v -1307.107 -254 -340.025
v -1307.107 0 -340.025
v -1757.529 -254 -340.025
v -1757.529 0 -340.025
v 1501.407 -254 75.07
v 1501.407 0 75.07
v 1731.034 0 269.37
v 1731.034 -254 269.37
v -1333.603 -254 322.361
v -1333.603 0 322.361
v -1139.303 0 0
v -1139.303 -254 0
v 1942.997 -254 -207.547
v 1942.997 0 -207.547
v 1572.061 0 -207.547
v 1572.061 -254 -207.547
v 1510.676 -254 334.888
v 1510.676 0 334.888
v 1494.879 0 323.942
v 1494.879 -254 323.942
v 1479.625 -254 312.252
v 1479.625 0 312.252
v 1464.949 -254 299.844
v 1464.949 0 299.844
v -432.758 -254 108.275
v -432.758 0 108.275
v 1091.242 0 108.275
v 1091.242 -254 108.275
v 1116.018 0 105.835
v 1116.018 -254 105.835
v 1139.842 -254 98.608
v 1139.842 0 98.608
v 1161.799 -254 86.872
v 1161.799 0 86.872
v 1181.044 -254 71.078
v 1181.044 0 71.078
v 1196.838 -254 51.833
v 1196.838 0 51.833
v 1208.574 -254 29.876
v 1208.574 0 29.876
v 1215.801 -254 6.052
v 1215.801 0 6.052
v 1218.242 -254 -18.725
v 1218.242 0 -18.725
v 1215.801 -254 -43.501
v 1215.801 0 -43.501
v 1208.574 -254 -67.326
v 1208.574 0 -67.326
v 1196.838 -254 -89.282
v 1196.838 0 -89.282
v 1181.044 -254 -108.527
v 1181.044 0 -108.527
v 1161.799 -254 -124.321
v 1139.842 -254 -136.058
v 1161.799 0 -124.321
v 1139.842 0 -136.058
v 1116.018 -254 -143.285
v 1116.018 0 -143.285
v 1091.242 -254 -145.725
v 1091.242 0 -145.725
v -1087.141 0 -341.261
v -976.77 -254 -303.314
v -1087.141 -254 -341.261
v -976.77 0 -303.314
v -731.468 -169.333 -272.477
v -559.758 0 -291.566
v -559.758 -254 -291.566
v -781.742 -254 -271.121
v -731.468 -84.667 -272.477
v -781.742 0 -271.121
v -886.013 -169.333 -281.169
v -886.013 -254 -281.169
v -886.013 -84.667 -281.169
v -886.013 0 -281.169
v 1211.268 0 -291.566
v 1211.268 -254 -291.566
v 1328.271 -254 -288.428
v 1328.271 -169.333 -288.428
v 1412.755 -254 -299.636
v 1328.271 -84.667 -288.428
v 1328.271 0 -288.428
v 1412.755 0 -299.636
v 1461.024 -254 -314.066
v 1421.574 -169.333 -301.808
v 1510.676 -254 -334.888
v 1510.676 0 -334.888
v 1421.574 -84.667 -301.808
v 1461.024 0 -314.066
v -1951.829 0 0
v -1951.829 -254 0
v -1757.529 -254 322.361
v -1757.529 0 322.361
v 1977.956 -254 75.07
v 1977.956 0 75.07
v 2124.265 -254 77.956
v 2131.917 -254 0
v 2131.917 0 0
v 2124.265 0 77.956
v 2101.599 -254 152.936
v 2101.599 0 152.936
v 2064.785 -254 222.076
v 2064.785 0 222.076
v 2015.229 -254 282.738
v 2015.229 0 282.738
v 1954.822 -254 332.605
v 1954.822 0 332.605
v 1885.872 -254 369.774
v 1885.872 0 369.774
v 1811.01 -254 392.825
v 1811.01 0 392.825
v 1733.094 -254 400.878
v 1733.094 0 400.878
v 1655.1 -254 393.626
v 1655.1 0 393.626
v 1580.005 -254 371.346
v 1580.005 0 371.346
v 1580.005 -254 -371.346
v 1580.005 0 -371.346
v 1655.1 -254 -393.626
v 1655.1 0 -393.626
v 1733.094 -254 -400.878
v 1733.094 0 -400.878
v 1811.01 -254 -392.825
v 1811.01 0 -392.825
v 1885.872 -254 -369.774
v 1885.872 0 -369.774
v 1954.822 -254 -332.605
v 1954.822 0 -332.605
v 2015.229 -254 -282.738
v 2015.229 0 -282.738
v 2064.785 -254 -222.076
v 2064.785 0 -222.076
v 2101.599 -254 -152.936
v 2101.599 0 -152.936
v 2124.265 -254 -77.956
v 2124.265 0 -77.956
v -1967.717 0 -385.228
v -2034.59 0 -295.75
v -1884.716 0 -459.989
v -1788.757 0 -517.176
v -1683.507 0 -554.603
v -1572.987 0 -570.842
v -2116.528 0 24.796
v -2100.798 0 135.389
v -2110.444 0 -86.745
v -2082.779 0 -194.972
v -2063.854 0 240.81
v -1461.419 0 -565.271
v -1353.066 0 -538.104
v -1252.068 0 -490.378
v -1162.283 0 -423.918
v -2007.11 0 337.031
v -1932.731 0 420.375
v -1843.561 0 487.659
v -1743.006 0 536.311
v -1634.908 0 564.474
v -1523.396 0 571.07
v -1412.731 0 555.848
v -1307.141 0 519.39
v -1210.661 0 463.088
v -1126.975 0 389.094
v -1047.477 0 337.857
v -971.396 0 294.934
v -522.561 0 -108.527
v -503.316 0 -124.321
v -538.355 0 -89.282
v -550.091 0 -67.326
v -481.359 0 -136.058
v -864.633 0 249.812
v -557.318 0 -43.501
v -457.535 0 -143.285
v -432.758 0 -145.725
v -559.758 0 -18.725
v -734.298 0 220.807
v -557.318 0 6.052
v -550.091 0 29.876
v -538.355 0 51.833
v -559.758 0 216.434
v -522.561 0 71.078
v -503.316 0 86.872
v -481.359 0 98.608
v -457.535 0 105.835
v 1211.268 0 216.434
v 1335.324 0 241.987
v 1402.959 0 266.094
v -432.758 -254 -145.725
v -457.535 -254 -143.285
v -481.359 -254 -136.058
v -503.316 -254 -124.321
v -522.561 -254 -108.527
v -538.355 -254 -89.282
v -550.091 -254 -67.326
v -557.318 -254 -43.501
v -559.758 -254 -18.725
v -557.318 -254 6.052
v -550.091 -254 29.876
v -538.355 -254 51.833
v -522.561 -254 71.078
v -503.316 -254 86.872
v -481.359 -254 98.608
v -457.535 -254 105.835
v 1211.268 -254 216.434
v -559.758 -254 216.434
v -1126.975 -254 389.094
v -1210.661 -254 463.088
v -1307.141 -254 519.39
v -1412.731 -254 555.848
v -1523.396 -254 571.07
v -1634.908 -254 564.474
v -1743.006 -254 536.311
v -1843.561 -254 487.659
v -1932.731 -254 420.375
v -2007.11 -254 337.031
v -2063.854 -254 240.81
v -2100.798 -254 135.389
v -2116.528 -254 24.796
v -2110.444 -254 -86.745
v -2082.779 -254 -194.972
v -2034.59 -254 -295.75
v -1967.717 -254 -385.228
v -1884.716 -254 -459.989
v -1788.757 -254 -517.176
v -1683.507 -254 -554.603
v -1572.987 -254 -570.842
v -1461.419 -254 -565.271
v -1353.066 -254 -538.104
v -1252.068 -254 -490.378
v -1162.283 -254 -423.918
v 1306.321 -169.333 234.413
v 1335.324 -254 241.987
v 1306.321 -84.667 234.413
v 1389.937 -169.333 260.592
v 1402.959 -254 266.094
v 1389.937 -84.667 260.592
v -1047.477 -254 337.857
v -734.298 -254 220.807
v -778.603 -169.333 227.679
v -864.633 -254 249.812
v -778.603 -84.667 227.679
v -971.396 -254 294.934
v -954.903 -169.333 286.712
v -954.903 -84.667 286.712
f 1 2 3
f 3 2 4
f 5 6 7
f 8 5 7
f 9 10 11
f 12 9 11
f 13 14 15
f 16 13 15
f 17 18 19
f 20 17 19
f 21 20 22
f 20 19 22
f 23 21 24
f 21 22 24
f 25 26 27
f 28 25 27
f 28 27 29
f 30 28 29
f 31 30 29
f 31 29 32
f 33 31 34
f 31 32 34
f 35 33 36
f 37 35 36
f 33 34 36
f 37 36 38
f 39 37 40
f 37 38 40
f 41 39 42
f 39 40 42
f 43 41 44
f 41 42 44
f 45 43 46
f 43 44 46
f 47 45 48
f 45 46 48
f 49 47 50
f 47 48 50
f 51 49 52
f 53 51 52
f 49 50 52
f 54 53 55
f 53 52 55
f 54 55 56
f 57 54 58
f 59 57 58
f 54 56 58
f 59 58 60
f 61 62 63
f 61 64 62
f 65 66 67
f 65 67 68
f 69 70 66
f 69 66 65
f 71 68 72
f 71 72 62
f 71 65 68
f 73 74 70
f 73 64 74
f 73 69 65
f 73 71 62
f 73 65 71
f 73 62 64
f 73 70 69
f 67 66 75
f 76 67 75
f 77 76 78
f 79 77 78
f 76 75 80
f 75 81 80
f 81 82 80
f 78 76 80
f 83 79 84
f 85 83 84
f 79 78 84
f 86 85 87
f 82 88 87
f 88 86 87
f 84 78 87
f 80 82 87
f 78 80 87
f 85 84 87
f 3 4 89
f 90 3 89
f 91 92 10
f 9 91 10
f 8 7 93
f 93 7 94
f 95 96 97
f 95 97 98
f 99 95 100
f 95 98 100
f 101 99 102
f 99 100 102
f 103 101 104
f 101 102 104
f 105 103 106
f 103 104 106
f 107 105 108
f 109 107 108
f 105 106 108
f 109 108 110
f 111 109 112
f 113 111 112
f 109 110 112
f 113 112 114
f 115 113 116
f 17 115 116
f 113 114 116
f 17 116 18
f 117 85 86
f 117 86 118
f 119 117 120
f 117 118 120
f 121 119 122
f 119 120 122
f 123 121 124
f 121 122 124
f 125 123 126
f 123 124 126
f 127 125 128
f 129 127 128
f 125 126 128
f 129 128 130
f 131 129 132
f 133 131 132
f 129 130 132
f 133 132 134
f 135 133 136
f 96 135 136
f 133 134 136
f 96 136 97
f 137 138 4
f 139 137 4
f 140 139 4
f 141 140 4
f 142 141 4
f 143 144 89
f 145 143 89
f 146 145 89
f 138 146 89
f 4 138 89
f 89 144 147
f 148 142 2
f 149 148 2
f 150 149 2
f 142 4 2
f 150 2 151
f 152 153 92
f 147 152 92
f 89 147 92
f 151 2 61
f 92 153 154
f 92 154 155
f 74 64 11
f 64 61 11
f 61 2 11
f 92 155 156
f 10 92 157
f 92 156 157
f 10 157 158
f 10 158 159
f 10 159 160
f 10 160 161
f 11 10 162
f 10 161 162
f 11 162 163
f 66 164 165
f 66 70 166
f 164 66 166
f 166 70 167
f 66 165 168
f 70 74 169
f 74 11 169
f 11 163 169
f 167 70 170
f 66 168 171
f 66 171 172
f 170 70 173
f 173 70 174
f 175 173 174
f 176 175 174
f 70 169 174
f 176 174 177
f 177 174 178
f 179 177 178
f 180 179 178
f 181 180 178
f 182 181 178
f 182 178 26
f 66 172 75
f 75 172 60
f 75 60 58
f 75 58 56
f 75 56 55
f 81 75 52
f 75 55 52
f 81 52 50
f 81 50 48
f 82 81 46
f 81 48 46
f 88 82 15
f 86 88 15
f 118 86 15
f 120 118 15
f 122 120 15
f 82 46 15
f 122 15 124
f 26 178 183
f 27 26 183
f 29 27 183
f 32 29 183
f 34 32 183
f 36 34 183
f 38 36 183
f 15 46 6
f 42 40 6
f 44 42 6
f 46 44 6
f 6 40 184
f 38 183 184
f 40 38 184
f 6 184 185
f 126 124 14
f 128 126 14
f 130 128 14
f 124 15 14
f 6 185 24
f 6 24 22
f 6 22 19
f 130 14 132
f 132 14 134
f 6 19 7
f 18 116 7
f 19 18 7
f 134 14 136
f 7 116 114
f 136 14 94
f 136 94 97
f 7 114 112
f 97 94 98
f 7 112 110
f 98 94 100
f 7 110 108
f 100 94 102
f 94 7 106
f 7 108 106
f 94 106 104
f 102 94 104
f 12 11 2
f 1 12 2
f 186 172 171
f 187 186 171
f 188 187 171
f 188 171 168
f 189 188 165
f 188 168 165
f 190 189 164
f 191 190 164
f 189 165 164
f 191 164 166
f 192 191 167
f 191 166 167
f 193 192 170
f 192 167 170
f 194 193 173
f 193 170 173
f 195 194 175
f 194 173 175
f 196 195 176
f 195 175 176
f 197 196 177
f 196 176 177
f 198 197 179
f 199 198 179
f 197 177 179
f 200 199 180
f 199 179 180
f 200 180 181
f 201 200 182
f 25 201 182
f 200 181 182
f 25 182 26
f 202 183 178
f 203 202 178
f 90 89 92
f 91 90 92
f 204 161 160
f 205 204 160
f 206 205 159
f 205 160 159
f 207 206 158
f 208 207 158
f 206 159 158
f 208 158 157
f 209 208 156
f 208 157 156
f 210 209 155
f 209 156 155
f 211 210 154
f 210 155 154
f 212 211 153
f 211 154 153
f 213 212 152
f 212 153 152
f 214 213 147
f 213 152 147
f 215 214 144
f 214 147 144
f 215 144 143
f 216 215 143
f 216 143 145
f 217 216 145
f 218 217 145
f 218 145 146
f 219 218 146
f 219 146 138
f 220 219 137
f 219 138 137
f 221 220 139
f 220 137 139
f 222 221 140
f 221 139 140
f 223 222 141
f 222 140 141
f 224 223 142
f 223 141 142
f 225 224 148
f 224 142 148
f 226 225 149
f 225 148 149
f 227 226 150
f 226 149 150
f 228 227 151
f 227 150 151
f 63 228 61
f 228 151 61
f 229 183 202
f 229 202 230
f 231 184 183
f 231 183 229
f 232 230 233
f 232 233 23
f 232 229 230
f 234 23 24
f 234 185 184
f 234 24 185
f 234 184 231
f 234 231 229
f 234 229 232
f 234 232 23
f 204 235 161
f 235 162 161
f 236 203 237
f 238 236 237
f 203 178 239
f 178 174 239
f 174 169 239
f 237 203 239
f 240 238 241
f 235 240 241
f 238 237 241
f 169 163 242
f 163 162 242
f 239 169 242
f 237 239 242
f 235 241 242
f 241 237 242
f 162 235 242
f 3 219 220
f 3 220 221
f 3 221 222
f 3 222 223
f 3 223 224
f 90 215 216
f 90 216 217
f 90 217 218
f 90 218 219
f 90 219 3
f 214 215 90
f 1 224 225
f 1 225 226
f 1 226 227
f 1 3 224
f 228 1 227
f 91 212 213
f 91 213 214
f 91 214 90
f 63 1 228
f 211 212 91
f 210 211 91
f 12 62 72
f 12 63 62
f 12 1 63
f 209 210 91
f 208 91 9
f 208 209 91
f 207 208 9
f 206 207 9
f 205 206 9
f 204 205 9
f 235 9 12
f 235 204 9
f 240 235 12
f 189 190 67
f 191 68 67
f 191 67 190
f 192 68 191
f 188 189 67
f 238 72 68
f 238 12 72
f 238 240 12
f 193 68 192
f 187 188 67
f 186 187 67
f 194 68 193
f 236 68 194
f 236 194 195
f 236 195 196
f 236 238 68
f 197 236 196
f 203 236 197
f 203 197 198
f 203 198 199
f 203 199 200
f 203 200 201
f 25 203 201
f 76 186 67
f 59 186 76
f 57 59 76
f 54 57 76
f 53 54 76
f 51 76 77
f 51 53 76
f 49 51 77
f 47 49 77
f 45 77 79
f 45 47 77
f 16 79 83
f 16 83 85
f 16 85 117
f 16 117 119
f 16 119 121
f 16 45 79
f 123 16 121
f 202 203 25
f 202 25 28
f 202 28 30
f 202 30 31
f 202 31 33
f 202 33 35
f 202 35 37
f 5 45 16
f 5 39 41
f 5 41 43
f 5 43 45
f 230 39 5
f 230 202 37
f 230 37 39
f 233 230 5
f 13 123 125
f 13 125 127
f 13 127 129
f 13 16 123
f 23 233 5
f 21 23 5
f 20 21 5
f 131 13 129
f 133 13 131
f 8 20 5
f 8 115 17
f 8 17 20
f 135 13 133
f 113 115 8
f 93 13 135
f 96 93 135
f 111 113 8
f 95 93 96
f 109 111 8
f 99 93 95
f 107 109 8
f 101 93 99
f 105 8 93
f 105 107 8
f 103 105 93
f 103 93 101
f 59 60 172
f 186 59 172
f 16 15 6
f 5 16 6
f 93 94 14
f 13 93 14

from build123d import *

# Parameters (mm, degrees)
F1_DEPTH = 254


with BuildPart() as f1:
    # F0 (on Front) → F1 (new body)
    with BuildSketch(Plane.XZ):
        with BuildLine():
            ThreePointArc((-1087.141313, -341.260851), (-1003.070928, -179.753285), (-974.066095, 0))
            ThreePointArc((-974.066095, 0), (-1013.665343, 209.030715), (-1126.975421, 389.093944))
            ThreePointArc((-1126.975421, 389.093944), (-2116.217968, -31.123789), (-1087.141313, -341.260851))
        make_face()
        Polygon((-1757.529435, 322.360922), (-1333.602755, 322.360922), (-1139.302952, 0), (-1307.107338, -340.024515), (-1757.529435, -340.024515), (-1951.829126, 0), align=None, mode=Mode.SUBTRACT)
        with BuildLine():
            ThreePointArc((-1126.975421, 389.093944), (-1013.665343, 209.030715), (-974.066095, 0))
            ThreePointArc((-974.066095, 0), (-1003.070928, -179.753285), (-1087.141313, -341.260851))
            add(Edge.make_bspline(
                [(-559.758476, -291.566129), (-761.299014, -266.459793), (-841.472745, -247.595385), (-1087.141313, -341.260851)],
                knots=[0, 0, 0, 0, 529.719003, 529.719003, 529.719003, 529.719003], degree=3))
            Line((-559.758476, -291.566129), (1211.268242, -291.566129))
            add(Edge.make_bspline(
                [(1211.268242, -291.566129), (1346.620798, -281.230956), (1417.175412, -290.896773), (1510.675747, -334.88778)],
                knots=[0, 0, 0, 0, 302.525402, 302.525402, 302.525402, 302.525402], degree=3))
            ThreePointArc((1510.675747, -334.88778), (1331.186688, -28.805318), (1464.949151, 299.844038))
            add(Edge.make_bspline(
                [(1211.268242, 216.433871), (1312.98523, 231.938394), (1393.292829, 252.429568), (1464.949151, 299.844038)],
                knots=[0, 0, 0, 0, 264.395233, 264.395233, 264.395233, 264.395233], degree=3))
            Line((1211.268242, 216.433871), (-559.758476, 216.433871))
            add(Edge.make_bspline(
                [(-559.758476, 216.433871), (-812.648896, 202.305573), (-944.243729, 266.517401), (-1126.975421, 389.093944)],
                knots=[0, 0, 0, 0, 592.913622, 592.913622, 592.913622, 592.913622], degree=3))
        make_face()
        with BuildLine():
            ThreePointArc((-432.758476, -145.72481), (-559.758476, -18.72481), (-432.758476, 108.27519))
            Line((-432.758476, 108.27519), (1091.241524, 108.27519))
            ThreePointArc((1091.241524, 108.27519), (1218.241524, -18.72481), (1091.241524, -145.72481))
            Line((1091.241524, -145.72481), (-432.758476, -145.72481))
        make_face(mode=Mode.SUBTRACT)
        with BuildLine():
            add(Edge.make_bspline(
                [(1464.949151, 299.844038), (1480.557889, 310.172226), (1495.756133, 321.777897), (1510.675747, 334.88778)],
                knots=[264.395233, 264.395233, 264.395233, 264.395233, 321.987861, 321.987861, 321.987861, 321.987861], degree=3))
            ThreePointArc((1464.949151, 299.844038), (1331.186688, -28.805318), (1510.675747, -334.88778))
            ThreePointArc((1510.675747, -334.88778), (1921.256936, -352.877799), (2131.917358, 0))
            ThreePointArc((2131.917358, 0), (1921.256936, 352.877799), (1510.675747, 334.88778))
        make_face()
        Polygon((1501.407028, 75.070354), (1731.033905, 269.370087), (1977.955699, 75.070354), (1942.997132, -207.547456), (1572.0614, -207.547456), align=None, mode=Mode.SUBTRACT)
        with BuildLine():
            ThreePointArc((1510.675747, 334.88778), (1487.182121, 318.188388), (1464.949151, 299.844038))
            add(Edge.make_bspline(
                [(1464.949151, 299.844038), (1480.557889, 310.172226), (1495.756133, 321.777897), (1510.675747, 334.88778)],
                knots=[264.395233, 264.395233, 264.395233, 264.395233, 321.987861, 321.987861, 321.987861, 321.987861], degree=3))
        make_face()
    extrude(amount=F1_DEPTH)


solid = f1.part
